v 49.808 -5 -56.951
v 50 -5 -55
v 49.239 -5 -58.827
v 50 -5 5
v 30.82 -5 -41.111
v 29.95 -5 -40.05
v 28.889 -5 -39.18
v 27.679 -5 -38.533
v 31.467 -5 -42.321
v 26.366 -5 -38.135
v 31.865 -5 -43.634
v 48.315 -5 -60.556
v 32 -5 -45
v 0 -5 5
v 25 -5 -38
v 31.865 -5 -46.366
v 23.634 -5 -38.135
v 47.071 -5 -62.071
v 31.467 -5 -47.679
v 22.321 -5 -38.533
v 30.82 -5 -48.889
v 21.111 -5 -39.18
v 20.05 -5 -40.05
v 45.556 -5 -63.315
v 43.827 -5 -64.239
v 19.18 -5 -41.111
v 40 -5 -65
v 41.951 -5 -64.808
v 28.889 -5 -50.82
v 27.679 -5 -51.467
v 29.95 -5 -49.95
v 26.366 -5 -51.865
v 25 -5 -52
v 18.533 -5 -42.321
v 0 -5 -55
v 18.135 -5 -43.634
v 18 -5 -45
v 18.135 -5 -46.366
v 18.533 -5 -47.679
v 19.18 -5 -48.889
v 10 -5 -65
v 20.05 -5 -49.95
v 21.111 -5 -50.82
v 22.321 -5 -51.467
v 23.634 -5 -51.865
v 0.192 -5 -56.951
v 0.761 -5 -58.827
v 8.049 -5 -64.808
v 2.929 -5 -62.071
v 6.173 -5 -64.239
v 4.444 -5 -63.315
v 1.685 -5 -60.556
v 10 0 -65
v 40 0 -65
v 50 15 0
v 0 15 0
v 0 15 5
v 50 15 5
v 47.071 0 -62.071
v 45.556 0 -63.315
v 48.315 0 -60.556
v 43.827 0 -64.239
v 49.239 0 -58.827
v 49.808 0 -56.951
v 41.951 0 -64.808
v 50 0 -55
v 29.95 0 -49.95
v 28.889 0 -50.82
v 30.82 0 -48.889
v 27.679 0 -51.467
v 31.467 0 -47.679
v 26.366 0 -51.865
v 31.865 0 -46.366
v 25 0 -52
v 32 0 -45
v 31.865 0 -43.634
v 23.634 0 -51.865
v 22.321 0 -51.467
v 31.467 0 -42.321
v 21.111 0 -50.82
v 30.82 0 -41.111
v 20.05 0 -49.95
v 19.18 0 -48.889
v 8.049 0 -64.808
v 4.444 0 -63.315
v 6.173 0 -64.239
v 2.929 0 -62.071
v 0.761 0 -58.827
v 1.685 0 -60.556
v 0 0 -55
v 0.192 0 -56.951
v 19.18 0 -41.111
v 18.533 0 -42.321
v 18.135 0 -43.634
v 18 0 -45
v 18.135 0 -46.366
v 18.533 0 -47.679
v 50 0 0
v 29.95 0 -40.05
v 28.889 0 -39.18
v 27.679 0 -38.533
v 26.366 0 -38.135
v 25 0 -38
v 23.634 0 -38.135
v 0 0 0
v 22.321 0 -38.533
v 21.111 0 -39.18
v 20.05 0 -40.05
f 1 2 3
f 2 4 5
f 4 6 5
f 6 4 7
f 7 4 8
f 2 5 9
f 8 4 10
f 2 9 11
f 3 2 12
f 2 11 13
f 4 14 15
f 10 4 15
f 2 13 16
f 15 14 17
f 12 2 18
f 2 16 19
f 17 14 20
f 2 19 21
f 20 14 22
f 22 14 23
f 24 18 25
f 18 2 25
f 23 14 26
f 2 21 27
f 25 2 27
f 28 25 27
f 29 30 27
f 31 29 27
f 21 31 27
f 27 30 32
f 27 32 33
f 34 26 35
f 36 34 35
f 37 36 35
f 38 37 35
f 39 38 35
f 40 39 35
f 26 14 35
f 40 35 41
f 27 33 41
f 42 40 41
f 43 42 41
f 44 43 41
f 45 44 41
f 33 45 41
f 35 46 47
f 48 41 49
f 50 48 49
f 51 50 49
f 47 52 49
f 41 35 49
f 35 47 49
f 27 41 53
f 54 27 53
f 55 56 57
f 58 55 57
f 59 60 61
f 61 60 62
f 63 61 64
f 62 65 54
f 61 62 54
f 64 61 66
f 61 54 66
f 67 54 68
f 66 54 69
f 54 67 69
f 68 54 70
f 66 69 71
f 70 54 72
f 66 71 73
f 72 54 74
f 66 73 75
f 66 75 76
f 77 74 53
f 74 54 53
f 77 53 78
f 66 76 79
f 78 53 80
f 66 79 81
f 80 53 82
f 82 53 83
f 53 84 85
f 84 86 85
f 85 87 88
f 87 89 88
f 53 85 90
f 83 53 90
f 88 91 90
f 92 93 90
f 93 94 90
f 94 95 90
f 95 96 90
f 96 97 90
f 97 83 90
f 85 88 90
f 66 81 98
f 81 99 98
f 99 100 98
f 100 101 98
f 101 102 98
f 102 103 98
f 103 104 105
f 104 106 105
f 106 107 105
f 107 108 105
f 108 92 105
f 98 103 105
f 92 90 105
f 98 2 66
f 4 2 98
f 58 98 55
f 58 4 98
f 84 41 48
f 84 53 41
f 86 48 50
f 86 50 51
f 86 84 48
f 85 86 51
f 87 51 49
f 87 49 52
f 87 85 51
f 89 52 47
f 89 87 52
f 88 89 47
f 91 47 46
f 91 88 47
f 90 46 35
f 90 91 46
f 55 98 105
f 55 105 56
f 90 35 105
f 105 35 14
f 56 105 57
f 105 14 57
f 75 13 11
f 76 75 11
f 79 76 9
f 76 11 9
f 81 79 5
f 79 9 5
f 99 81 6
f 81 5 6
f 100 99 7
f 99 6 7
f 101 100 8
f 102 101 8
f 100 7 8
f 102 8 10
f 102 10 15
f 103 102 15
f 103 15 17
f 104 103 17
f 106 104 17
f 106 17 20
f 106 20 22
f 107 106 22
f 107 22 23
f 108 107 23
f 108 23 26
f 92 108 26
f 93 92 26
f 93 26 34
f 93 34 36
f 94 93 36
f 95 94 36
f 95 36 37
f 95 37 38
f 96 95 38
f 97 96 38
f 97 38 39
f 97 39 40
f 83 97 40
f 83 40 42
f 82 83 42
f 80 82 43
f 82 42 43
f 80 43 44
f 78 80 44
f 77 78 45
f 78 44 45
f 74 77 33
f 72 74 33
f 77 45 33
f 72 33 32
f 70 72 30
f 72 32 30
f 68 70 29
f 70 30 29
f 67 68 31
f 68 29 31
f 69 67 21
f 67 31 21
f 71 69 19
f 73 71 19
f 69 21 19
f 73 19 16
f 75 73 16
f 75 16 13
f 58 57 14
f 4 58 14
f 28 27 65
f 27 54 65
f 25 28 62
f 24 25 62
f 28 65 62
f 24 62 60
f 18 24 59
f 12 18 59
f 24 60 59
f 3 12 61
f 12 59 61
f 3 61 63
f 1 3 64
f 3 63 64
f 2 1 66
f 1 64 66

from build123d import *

# Parameters (mm, degrees)
F1_DEPTH = 50
F2_R     = 7
F3_DEPTH = 25
F4_R     = 10


with BuildPart() as f1:
    # F0 (on Right) → F1 (new body)
    with BuildSketch(Plane.YZ):
        Polygon((-5, -65), (0, -65), (0, 0), (15, 0), (15, 5), (-5, 5), align=None)
    extrude(amount=F1_DEPTH)

    # F2 (on face) → F3 (cut)
    with BuildSketch(Plane.XZ.offset(5)):
        with Locations((25, -45)):
            Circle(F2_R)
    extrude(amount=-F3_DEPTH, mode=Mode.SUBTRACT)

    # F4
    f4_edges = [f1.edges().sort_by_distance(p)[0] for p in [
        (0, -2.5, -65),
        (50, -2.5, -65),
    ]]
    fillet(f4_edges, radius=F4_R)


solid = f1.part
